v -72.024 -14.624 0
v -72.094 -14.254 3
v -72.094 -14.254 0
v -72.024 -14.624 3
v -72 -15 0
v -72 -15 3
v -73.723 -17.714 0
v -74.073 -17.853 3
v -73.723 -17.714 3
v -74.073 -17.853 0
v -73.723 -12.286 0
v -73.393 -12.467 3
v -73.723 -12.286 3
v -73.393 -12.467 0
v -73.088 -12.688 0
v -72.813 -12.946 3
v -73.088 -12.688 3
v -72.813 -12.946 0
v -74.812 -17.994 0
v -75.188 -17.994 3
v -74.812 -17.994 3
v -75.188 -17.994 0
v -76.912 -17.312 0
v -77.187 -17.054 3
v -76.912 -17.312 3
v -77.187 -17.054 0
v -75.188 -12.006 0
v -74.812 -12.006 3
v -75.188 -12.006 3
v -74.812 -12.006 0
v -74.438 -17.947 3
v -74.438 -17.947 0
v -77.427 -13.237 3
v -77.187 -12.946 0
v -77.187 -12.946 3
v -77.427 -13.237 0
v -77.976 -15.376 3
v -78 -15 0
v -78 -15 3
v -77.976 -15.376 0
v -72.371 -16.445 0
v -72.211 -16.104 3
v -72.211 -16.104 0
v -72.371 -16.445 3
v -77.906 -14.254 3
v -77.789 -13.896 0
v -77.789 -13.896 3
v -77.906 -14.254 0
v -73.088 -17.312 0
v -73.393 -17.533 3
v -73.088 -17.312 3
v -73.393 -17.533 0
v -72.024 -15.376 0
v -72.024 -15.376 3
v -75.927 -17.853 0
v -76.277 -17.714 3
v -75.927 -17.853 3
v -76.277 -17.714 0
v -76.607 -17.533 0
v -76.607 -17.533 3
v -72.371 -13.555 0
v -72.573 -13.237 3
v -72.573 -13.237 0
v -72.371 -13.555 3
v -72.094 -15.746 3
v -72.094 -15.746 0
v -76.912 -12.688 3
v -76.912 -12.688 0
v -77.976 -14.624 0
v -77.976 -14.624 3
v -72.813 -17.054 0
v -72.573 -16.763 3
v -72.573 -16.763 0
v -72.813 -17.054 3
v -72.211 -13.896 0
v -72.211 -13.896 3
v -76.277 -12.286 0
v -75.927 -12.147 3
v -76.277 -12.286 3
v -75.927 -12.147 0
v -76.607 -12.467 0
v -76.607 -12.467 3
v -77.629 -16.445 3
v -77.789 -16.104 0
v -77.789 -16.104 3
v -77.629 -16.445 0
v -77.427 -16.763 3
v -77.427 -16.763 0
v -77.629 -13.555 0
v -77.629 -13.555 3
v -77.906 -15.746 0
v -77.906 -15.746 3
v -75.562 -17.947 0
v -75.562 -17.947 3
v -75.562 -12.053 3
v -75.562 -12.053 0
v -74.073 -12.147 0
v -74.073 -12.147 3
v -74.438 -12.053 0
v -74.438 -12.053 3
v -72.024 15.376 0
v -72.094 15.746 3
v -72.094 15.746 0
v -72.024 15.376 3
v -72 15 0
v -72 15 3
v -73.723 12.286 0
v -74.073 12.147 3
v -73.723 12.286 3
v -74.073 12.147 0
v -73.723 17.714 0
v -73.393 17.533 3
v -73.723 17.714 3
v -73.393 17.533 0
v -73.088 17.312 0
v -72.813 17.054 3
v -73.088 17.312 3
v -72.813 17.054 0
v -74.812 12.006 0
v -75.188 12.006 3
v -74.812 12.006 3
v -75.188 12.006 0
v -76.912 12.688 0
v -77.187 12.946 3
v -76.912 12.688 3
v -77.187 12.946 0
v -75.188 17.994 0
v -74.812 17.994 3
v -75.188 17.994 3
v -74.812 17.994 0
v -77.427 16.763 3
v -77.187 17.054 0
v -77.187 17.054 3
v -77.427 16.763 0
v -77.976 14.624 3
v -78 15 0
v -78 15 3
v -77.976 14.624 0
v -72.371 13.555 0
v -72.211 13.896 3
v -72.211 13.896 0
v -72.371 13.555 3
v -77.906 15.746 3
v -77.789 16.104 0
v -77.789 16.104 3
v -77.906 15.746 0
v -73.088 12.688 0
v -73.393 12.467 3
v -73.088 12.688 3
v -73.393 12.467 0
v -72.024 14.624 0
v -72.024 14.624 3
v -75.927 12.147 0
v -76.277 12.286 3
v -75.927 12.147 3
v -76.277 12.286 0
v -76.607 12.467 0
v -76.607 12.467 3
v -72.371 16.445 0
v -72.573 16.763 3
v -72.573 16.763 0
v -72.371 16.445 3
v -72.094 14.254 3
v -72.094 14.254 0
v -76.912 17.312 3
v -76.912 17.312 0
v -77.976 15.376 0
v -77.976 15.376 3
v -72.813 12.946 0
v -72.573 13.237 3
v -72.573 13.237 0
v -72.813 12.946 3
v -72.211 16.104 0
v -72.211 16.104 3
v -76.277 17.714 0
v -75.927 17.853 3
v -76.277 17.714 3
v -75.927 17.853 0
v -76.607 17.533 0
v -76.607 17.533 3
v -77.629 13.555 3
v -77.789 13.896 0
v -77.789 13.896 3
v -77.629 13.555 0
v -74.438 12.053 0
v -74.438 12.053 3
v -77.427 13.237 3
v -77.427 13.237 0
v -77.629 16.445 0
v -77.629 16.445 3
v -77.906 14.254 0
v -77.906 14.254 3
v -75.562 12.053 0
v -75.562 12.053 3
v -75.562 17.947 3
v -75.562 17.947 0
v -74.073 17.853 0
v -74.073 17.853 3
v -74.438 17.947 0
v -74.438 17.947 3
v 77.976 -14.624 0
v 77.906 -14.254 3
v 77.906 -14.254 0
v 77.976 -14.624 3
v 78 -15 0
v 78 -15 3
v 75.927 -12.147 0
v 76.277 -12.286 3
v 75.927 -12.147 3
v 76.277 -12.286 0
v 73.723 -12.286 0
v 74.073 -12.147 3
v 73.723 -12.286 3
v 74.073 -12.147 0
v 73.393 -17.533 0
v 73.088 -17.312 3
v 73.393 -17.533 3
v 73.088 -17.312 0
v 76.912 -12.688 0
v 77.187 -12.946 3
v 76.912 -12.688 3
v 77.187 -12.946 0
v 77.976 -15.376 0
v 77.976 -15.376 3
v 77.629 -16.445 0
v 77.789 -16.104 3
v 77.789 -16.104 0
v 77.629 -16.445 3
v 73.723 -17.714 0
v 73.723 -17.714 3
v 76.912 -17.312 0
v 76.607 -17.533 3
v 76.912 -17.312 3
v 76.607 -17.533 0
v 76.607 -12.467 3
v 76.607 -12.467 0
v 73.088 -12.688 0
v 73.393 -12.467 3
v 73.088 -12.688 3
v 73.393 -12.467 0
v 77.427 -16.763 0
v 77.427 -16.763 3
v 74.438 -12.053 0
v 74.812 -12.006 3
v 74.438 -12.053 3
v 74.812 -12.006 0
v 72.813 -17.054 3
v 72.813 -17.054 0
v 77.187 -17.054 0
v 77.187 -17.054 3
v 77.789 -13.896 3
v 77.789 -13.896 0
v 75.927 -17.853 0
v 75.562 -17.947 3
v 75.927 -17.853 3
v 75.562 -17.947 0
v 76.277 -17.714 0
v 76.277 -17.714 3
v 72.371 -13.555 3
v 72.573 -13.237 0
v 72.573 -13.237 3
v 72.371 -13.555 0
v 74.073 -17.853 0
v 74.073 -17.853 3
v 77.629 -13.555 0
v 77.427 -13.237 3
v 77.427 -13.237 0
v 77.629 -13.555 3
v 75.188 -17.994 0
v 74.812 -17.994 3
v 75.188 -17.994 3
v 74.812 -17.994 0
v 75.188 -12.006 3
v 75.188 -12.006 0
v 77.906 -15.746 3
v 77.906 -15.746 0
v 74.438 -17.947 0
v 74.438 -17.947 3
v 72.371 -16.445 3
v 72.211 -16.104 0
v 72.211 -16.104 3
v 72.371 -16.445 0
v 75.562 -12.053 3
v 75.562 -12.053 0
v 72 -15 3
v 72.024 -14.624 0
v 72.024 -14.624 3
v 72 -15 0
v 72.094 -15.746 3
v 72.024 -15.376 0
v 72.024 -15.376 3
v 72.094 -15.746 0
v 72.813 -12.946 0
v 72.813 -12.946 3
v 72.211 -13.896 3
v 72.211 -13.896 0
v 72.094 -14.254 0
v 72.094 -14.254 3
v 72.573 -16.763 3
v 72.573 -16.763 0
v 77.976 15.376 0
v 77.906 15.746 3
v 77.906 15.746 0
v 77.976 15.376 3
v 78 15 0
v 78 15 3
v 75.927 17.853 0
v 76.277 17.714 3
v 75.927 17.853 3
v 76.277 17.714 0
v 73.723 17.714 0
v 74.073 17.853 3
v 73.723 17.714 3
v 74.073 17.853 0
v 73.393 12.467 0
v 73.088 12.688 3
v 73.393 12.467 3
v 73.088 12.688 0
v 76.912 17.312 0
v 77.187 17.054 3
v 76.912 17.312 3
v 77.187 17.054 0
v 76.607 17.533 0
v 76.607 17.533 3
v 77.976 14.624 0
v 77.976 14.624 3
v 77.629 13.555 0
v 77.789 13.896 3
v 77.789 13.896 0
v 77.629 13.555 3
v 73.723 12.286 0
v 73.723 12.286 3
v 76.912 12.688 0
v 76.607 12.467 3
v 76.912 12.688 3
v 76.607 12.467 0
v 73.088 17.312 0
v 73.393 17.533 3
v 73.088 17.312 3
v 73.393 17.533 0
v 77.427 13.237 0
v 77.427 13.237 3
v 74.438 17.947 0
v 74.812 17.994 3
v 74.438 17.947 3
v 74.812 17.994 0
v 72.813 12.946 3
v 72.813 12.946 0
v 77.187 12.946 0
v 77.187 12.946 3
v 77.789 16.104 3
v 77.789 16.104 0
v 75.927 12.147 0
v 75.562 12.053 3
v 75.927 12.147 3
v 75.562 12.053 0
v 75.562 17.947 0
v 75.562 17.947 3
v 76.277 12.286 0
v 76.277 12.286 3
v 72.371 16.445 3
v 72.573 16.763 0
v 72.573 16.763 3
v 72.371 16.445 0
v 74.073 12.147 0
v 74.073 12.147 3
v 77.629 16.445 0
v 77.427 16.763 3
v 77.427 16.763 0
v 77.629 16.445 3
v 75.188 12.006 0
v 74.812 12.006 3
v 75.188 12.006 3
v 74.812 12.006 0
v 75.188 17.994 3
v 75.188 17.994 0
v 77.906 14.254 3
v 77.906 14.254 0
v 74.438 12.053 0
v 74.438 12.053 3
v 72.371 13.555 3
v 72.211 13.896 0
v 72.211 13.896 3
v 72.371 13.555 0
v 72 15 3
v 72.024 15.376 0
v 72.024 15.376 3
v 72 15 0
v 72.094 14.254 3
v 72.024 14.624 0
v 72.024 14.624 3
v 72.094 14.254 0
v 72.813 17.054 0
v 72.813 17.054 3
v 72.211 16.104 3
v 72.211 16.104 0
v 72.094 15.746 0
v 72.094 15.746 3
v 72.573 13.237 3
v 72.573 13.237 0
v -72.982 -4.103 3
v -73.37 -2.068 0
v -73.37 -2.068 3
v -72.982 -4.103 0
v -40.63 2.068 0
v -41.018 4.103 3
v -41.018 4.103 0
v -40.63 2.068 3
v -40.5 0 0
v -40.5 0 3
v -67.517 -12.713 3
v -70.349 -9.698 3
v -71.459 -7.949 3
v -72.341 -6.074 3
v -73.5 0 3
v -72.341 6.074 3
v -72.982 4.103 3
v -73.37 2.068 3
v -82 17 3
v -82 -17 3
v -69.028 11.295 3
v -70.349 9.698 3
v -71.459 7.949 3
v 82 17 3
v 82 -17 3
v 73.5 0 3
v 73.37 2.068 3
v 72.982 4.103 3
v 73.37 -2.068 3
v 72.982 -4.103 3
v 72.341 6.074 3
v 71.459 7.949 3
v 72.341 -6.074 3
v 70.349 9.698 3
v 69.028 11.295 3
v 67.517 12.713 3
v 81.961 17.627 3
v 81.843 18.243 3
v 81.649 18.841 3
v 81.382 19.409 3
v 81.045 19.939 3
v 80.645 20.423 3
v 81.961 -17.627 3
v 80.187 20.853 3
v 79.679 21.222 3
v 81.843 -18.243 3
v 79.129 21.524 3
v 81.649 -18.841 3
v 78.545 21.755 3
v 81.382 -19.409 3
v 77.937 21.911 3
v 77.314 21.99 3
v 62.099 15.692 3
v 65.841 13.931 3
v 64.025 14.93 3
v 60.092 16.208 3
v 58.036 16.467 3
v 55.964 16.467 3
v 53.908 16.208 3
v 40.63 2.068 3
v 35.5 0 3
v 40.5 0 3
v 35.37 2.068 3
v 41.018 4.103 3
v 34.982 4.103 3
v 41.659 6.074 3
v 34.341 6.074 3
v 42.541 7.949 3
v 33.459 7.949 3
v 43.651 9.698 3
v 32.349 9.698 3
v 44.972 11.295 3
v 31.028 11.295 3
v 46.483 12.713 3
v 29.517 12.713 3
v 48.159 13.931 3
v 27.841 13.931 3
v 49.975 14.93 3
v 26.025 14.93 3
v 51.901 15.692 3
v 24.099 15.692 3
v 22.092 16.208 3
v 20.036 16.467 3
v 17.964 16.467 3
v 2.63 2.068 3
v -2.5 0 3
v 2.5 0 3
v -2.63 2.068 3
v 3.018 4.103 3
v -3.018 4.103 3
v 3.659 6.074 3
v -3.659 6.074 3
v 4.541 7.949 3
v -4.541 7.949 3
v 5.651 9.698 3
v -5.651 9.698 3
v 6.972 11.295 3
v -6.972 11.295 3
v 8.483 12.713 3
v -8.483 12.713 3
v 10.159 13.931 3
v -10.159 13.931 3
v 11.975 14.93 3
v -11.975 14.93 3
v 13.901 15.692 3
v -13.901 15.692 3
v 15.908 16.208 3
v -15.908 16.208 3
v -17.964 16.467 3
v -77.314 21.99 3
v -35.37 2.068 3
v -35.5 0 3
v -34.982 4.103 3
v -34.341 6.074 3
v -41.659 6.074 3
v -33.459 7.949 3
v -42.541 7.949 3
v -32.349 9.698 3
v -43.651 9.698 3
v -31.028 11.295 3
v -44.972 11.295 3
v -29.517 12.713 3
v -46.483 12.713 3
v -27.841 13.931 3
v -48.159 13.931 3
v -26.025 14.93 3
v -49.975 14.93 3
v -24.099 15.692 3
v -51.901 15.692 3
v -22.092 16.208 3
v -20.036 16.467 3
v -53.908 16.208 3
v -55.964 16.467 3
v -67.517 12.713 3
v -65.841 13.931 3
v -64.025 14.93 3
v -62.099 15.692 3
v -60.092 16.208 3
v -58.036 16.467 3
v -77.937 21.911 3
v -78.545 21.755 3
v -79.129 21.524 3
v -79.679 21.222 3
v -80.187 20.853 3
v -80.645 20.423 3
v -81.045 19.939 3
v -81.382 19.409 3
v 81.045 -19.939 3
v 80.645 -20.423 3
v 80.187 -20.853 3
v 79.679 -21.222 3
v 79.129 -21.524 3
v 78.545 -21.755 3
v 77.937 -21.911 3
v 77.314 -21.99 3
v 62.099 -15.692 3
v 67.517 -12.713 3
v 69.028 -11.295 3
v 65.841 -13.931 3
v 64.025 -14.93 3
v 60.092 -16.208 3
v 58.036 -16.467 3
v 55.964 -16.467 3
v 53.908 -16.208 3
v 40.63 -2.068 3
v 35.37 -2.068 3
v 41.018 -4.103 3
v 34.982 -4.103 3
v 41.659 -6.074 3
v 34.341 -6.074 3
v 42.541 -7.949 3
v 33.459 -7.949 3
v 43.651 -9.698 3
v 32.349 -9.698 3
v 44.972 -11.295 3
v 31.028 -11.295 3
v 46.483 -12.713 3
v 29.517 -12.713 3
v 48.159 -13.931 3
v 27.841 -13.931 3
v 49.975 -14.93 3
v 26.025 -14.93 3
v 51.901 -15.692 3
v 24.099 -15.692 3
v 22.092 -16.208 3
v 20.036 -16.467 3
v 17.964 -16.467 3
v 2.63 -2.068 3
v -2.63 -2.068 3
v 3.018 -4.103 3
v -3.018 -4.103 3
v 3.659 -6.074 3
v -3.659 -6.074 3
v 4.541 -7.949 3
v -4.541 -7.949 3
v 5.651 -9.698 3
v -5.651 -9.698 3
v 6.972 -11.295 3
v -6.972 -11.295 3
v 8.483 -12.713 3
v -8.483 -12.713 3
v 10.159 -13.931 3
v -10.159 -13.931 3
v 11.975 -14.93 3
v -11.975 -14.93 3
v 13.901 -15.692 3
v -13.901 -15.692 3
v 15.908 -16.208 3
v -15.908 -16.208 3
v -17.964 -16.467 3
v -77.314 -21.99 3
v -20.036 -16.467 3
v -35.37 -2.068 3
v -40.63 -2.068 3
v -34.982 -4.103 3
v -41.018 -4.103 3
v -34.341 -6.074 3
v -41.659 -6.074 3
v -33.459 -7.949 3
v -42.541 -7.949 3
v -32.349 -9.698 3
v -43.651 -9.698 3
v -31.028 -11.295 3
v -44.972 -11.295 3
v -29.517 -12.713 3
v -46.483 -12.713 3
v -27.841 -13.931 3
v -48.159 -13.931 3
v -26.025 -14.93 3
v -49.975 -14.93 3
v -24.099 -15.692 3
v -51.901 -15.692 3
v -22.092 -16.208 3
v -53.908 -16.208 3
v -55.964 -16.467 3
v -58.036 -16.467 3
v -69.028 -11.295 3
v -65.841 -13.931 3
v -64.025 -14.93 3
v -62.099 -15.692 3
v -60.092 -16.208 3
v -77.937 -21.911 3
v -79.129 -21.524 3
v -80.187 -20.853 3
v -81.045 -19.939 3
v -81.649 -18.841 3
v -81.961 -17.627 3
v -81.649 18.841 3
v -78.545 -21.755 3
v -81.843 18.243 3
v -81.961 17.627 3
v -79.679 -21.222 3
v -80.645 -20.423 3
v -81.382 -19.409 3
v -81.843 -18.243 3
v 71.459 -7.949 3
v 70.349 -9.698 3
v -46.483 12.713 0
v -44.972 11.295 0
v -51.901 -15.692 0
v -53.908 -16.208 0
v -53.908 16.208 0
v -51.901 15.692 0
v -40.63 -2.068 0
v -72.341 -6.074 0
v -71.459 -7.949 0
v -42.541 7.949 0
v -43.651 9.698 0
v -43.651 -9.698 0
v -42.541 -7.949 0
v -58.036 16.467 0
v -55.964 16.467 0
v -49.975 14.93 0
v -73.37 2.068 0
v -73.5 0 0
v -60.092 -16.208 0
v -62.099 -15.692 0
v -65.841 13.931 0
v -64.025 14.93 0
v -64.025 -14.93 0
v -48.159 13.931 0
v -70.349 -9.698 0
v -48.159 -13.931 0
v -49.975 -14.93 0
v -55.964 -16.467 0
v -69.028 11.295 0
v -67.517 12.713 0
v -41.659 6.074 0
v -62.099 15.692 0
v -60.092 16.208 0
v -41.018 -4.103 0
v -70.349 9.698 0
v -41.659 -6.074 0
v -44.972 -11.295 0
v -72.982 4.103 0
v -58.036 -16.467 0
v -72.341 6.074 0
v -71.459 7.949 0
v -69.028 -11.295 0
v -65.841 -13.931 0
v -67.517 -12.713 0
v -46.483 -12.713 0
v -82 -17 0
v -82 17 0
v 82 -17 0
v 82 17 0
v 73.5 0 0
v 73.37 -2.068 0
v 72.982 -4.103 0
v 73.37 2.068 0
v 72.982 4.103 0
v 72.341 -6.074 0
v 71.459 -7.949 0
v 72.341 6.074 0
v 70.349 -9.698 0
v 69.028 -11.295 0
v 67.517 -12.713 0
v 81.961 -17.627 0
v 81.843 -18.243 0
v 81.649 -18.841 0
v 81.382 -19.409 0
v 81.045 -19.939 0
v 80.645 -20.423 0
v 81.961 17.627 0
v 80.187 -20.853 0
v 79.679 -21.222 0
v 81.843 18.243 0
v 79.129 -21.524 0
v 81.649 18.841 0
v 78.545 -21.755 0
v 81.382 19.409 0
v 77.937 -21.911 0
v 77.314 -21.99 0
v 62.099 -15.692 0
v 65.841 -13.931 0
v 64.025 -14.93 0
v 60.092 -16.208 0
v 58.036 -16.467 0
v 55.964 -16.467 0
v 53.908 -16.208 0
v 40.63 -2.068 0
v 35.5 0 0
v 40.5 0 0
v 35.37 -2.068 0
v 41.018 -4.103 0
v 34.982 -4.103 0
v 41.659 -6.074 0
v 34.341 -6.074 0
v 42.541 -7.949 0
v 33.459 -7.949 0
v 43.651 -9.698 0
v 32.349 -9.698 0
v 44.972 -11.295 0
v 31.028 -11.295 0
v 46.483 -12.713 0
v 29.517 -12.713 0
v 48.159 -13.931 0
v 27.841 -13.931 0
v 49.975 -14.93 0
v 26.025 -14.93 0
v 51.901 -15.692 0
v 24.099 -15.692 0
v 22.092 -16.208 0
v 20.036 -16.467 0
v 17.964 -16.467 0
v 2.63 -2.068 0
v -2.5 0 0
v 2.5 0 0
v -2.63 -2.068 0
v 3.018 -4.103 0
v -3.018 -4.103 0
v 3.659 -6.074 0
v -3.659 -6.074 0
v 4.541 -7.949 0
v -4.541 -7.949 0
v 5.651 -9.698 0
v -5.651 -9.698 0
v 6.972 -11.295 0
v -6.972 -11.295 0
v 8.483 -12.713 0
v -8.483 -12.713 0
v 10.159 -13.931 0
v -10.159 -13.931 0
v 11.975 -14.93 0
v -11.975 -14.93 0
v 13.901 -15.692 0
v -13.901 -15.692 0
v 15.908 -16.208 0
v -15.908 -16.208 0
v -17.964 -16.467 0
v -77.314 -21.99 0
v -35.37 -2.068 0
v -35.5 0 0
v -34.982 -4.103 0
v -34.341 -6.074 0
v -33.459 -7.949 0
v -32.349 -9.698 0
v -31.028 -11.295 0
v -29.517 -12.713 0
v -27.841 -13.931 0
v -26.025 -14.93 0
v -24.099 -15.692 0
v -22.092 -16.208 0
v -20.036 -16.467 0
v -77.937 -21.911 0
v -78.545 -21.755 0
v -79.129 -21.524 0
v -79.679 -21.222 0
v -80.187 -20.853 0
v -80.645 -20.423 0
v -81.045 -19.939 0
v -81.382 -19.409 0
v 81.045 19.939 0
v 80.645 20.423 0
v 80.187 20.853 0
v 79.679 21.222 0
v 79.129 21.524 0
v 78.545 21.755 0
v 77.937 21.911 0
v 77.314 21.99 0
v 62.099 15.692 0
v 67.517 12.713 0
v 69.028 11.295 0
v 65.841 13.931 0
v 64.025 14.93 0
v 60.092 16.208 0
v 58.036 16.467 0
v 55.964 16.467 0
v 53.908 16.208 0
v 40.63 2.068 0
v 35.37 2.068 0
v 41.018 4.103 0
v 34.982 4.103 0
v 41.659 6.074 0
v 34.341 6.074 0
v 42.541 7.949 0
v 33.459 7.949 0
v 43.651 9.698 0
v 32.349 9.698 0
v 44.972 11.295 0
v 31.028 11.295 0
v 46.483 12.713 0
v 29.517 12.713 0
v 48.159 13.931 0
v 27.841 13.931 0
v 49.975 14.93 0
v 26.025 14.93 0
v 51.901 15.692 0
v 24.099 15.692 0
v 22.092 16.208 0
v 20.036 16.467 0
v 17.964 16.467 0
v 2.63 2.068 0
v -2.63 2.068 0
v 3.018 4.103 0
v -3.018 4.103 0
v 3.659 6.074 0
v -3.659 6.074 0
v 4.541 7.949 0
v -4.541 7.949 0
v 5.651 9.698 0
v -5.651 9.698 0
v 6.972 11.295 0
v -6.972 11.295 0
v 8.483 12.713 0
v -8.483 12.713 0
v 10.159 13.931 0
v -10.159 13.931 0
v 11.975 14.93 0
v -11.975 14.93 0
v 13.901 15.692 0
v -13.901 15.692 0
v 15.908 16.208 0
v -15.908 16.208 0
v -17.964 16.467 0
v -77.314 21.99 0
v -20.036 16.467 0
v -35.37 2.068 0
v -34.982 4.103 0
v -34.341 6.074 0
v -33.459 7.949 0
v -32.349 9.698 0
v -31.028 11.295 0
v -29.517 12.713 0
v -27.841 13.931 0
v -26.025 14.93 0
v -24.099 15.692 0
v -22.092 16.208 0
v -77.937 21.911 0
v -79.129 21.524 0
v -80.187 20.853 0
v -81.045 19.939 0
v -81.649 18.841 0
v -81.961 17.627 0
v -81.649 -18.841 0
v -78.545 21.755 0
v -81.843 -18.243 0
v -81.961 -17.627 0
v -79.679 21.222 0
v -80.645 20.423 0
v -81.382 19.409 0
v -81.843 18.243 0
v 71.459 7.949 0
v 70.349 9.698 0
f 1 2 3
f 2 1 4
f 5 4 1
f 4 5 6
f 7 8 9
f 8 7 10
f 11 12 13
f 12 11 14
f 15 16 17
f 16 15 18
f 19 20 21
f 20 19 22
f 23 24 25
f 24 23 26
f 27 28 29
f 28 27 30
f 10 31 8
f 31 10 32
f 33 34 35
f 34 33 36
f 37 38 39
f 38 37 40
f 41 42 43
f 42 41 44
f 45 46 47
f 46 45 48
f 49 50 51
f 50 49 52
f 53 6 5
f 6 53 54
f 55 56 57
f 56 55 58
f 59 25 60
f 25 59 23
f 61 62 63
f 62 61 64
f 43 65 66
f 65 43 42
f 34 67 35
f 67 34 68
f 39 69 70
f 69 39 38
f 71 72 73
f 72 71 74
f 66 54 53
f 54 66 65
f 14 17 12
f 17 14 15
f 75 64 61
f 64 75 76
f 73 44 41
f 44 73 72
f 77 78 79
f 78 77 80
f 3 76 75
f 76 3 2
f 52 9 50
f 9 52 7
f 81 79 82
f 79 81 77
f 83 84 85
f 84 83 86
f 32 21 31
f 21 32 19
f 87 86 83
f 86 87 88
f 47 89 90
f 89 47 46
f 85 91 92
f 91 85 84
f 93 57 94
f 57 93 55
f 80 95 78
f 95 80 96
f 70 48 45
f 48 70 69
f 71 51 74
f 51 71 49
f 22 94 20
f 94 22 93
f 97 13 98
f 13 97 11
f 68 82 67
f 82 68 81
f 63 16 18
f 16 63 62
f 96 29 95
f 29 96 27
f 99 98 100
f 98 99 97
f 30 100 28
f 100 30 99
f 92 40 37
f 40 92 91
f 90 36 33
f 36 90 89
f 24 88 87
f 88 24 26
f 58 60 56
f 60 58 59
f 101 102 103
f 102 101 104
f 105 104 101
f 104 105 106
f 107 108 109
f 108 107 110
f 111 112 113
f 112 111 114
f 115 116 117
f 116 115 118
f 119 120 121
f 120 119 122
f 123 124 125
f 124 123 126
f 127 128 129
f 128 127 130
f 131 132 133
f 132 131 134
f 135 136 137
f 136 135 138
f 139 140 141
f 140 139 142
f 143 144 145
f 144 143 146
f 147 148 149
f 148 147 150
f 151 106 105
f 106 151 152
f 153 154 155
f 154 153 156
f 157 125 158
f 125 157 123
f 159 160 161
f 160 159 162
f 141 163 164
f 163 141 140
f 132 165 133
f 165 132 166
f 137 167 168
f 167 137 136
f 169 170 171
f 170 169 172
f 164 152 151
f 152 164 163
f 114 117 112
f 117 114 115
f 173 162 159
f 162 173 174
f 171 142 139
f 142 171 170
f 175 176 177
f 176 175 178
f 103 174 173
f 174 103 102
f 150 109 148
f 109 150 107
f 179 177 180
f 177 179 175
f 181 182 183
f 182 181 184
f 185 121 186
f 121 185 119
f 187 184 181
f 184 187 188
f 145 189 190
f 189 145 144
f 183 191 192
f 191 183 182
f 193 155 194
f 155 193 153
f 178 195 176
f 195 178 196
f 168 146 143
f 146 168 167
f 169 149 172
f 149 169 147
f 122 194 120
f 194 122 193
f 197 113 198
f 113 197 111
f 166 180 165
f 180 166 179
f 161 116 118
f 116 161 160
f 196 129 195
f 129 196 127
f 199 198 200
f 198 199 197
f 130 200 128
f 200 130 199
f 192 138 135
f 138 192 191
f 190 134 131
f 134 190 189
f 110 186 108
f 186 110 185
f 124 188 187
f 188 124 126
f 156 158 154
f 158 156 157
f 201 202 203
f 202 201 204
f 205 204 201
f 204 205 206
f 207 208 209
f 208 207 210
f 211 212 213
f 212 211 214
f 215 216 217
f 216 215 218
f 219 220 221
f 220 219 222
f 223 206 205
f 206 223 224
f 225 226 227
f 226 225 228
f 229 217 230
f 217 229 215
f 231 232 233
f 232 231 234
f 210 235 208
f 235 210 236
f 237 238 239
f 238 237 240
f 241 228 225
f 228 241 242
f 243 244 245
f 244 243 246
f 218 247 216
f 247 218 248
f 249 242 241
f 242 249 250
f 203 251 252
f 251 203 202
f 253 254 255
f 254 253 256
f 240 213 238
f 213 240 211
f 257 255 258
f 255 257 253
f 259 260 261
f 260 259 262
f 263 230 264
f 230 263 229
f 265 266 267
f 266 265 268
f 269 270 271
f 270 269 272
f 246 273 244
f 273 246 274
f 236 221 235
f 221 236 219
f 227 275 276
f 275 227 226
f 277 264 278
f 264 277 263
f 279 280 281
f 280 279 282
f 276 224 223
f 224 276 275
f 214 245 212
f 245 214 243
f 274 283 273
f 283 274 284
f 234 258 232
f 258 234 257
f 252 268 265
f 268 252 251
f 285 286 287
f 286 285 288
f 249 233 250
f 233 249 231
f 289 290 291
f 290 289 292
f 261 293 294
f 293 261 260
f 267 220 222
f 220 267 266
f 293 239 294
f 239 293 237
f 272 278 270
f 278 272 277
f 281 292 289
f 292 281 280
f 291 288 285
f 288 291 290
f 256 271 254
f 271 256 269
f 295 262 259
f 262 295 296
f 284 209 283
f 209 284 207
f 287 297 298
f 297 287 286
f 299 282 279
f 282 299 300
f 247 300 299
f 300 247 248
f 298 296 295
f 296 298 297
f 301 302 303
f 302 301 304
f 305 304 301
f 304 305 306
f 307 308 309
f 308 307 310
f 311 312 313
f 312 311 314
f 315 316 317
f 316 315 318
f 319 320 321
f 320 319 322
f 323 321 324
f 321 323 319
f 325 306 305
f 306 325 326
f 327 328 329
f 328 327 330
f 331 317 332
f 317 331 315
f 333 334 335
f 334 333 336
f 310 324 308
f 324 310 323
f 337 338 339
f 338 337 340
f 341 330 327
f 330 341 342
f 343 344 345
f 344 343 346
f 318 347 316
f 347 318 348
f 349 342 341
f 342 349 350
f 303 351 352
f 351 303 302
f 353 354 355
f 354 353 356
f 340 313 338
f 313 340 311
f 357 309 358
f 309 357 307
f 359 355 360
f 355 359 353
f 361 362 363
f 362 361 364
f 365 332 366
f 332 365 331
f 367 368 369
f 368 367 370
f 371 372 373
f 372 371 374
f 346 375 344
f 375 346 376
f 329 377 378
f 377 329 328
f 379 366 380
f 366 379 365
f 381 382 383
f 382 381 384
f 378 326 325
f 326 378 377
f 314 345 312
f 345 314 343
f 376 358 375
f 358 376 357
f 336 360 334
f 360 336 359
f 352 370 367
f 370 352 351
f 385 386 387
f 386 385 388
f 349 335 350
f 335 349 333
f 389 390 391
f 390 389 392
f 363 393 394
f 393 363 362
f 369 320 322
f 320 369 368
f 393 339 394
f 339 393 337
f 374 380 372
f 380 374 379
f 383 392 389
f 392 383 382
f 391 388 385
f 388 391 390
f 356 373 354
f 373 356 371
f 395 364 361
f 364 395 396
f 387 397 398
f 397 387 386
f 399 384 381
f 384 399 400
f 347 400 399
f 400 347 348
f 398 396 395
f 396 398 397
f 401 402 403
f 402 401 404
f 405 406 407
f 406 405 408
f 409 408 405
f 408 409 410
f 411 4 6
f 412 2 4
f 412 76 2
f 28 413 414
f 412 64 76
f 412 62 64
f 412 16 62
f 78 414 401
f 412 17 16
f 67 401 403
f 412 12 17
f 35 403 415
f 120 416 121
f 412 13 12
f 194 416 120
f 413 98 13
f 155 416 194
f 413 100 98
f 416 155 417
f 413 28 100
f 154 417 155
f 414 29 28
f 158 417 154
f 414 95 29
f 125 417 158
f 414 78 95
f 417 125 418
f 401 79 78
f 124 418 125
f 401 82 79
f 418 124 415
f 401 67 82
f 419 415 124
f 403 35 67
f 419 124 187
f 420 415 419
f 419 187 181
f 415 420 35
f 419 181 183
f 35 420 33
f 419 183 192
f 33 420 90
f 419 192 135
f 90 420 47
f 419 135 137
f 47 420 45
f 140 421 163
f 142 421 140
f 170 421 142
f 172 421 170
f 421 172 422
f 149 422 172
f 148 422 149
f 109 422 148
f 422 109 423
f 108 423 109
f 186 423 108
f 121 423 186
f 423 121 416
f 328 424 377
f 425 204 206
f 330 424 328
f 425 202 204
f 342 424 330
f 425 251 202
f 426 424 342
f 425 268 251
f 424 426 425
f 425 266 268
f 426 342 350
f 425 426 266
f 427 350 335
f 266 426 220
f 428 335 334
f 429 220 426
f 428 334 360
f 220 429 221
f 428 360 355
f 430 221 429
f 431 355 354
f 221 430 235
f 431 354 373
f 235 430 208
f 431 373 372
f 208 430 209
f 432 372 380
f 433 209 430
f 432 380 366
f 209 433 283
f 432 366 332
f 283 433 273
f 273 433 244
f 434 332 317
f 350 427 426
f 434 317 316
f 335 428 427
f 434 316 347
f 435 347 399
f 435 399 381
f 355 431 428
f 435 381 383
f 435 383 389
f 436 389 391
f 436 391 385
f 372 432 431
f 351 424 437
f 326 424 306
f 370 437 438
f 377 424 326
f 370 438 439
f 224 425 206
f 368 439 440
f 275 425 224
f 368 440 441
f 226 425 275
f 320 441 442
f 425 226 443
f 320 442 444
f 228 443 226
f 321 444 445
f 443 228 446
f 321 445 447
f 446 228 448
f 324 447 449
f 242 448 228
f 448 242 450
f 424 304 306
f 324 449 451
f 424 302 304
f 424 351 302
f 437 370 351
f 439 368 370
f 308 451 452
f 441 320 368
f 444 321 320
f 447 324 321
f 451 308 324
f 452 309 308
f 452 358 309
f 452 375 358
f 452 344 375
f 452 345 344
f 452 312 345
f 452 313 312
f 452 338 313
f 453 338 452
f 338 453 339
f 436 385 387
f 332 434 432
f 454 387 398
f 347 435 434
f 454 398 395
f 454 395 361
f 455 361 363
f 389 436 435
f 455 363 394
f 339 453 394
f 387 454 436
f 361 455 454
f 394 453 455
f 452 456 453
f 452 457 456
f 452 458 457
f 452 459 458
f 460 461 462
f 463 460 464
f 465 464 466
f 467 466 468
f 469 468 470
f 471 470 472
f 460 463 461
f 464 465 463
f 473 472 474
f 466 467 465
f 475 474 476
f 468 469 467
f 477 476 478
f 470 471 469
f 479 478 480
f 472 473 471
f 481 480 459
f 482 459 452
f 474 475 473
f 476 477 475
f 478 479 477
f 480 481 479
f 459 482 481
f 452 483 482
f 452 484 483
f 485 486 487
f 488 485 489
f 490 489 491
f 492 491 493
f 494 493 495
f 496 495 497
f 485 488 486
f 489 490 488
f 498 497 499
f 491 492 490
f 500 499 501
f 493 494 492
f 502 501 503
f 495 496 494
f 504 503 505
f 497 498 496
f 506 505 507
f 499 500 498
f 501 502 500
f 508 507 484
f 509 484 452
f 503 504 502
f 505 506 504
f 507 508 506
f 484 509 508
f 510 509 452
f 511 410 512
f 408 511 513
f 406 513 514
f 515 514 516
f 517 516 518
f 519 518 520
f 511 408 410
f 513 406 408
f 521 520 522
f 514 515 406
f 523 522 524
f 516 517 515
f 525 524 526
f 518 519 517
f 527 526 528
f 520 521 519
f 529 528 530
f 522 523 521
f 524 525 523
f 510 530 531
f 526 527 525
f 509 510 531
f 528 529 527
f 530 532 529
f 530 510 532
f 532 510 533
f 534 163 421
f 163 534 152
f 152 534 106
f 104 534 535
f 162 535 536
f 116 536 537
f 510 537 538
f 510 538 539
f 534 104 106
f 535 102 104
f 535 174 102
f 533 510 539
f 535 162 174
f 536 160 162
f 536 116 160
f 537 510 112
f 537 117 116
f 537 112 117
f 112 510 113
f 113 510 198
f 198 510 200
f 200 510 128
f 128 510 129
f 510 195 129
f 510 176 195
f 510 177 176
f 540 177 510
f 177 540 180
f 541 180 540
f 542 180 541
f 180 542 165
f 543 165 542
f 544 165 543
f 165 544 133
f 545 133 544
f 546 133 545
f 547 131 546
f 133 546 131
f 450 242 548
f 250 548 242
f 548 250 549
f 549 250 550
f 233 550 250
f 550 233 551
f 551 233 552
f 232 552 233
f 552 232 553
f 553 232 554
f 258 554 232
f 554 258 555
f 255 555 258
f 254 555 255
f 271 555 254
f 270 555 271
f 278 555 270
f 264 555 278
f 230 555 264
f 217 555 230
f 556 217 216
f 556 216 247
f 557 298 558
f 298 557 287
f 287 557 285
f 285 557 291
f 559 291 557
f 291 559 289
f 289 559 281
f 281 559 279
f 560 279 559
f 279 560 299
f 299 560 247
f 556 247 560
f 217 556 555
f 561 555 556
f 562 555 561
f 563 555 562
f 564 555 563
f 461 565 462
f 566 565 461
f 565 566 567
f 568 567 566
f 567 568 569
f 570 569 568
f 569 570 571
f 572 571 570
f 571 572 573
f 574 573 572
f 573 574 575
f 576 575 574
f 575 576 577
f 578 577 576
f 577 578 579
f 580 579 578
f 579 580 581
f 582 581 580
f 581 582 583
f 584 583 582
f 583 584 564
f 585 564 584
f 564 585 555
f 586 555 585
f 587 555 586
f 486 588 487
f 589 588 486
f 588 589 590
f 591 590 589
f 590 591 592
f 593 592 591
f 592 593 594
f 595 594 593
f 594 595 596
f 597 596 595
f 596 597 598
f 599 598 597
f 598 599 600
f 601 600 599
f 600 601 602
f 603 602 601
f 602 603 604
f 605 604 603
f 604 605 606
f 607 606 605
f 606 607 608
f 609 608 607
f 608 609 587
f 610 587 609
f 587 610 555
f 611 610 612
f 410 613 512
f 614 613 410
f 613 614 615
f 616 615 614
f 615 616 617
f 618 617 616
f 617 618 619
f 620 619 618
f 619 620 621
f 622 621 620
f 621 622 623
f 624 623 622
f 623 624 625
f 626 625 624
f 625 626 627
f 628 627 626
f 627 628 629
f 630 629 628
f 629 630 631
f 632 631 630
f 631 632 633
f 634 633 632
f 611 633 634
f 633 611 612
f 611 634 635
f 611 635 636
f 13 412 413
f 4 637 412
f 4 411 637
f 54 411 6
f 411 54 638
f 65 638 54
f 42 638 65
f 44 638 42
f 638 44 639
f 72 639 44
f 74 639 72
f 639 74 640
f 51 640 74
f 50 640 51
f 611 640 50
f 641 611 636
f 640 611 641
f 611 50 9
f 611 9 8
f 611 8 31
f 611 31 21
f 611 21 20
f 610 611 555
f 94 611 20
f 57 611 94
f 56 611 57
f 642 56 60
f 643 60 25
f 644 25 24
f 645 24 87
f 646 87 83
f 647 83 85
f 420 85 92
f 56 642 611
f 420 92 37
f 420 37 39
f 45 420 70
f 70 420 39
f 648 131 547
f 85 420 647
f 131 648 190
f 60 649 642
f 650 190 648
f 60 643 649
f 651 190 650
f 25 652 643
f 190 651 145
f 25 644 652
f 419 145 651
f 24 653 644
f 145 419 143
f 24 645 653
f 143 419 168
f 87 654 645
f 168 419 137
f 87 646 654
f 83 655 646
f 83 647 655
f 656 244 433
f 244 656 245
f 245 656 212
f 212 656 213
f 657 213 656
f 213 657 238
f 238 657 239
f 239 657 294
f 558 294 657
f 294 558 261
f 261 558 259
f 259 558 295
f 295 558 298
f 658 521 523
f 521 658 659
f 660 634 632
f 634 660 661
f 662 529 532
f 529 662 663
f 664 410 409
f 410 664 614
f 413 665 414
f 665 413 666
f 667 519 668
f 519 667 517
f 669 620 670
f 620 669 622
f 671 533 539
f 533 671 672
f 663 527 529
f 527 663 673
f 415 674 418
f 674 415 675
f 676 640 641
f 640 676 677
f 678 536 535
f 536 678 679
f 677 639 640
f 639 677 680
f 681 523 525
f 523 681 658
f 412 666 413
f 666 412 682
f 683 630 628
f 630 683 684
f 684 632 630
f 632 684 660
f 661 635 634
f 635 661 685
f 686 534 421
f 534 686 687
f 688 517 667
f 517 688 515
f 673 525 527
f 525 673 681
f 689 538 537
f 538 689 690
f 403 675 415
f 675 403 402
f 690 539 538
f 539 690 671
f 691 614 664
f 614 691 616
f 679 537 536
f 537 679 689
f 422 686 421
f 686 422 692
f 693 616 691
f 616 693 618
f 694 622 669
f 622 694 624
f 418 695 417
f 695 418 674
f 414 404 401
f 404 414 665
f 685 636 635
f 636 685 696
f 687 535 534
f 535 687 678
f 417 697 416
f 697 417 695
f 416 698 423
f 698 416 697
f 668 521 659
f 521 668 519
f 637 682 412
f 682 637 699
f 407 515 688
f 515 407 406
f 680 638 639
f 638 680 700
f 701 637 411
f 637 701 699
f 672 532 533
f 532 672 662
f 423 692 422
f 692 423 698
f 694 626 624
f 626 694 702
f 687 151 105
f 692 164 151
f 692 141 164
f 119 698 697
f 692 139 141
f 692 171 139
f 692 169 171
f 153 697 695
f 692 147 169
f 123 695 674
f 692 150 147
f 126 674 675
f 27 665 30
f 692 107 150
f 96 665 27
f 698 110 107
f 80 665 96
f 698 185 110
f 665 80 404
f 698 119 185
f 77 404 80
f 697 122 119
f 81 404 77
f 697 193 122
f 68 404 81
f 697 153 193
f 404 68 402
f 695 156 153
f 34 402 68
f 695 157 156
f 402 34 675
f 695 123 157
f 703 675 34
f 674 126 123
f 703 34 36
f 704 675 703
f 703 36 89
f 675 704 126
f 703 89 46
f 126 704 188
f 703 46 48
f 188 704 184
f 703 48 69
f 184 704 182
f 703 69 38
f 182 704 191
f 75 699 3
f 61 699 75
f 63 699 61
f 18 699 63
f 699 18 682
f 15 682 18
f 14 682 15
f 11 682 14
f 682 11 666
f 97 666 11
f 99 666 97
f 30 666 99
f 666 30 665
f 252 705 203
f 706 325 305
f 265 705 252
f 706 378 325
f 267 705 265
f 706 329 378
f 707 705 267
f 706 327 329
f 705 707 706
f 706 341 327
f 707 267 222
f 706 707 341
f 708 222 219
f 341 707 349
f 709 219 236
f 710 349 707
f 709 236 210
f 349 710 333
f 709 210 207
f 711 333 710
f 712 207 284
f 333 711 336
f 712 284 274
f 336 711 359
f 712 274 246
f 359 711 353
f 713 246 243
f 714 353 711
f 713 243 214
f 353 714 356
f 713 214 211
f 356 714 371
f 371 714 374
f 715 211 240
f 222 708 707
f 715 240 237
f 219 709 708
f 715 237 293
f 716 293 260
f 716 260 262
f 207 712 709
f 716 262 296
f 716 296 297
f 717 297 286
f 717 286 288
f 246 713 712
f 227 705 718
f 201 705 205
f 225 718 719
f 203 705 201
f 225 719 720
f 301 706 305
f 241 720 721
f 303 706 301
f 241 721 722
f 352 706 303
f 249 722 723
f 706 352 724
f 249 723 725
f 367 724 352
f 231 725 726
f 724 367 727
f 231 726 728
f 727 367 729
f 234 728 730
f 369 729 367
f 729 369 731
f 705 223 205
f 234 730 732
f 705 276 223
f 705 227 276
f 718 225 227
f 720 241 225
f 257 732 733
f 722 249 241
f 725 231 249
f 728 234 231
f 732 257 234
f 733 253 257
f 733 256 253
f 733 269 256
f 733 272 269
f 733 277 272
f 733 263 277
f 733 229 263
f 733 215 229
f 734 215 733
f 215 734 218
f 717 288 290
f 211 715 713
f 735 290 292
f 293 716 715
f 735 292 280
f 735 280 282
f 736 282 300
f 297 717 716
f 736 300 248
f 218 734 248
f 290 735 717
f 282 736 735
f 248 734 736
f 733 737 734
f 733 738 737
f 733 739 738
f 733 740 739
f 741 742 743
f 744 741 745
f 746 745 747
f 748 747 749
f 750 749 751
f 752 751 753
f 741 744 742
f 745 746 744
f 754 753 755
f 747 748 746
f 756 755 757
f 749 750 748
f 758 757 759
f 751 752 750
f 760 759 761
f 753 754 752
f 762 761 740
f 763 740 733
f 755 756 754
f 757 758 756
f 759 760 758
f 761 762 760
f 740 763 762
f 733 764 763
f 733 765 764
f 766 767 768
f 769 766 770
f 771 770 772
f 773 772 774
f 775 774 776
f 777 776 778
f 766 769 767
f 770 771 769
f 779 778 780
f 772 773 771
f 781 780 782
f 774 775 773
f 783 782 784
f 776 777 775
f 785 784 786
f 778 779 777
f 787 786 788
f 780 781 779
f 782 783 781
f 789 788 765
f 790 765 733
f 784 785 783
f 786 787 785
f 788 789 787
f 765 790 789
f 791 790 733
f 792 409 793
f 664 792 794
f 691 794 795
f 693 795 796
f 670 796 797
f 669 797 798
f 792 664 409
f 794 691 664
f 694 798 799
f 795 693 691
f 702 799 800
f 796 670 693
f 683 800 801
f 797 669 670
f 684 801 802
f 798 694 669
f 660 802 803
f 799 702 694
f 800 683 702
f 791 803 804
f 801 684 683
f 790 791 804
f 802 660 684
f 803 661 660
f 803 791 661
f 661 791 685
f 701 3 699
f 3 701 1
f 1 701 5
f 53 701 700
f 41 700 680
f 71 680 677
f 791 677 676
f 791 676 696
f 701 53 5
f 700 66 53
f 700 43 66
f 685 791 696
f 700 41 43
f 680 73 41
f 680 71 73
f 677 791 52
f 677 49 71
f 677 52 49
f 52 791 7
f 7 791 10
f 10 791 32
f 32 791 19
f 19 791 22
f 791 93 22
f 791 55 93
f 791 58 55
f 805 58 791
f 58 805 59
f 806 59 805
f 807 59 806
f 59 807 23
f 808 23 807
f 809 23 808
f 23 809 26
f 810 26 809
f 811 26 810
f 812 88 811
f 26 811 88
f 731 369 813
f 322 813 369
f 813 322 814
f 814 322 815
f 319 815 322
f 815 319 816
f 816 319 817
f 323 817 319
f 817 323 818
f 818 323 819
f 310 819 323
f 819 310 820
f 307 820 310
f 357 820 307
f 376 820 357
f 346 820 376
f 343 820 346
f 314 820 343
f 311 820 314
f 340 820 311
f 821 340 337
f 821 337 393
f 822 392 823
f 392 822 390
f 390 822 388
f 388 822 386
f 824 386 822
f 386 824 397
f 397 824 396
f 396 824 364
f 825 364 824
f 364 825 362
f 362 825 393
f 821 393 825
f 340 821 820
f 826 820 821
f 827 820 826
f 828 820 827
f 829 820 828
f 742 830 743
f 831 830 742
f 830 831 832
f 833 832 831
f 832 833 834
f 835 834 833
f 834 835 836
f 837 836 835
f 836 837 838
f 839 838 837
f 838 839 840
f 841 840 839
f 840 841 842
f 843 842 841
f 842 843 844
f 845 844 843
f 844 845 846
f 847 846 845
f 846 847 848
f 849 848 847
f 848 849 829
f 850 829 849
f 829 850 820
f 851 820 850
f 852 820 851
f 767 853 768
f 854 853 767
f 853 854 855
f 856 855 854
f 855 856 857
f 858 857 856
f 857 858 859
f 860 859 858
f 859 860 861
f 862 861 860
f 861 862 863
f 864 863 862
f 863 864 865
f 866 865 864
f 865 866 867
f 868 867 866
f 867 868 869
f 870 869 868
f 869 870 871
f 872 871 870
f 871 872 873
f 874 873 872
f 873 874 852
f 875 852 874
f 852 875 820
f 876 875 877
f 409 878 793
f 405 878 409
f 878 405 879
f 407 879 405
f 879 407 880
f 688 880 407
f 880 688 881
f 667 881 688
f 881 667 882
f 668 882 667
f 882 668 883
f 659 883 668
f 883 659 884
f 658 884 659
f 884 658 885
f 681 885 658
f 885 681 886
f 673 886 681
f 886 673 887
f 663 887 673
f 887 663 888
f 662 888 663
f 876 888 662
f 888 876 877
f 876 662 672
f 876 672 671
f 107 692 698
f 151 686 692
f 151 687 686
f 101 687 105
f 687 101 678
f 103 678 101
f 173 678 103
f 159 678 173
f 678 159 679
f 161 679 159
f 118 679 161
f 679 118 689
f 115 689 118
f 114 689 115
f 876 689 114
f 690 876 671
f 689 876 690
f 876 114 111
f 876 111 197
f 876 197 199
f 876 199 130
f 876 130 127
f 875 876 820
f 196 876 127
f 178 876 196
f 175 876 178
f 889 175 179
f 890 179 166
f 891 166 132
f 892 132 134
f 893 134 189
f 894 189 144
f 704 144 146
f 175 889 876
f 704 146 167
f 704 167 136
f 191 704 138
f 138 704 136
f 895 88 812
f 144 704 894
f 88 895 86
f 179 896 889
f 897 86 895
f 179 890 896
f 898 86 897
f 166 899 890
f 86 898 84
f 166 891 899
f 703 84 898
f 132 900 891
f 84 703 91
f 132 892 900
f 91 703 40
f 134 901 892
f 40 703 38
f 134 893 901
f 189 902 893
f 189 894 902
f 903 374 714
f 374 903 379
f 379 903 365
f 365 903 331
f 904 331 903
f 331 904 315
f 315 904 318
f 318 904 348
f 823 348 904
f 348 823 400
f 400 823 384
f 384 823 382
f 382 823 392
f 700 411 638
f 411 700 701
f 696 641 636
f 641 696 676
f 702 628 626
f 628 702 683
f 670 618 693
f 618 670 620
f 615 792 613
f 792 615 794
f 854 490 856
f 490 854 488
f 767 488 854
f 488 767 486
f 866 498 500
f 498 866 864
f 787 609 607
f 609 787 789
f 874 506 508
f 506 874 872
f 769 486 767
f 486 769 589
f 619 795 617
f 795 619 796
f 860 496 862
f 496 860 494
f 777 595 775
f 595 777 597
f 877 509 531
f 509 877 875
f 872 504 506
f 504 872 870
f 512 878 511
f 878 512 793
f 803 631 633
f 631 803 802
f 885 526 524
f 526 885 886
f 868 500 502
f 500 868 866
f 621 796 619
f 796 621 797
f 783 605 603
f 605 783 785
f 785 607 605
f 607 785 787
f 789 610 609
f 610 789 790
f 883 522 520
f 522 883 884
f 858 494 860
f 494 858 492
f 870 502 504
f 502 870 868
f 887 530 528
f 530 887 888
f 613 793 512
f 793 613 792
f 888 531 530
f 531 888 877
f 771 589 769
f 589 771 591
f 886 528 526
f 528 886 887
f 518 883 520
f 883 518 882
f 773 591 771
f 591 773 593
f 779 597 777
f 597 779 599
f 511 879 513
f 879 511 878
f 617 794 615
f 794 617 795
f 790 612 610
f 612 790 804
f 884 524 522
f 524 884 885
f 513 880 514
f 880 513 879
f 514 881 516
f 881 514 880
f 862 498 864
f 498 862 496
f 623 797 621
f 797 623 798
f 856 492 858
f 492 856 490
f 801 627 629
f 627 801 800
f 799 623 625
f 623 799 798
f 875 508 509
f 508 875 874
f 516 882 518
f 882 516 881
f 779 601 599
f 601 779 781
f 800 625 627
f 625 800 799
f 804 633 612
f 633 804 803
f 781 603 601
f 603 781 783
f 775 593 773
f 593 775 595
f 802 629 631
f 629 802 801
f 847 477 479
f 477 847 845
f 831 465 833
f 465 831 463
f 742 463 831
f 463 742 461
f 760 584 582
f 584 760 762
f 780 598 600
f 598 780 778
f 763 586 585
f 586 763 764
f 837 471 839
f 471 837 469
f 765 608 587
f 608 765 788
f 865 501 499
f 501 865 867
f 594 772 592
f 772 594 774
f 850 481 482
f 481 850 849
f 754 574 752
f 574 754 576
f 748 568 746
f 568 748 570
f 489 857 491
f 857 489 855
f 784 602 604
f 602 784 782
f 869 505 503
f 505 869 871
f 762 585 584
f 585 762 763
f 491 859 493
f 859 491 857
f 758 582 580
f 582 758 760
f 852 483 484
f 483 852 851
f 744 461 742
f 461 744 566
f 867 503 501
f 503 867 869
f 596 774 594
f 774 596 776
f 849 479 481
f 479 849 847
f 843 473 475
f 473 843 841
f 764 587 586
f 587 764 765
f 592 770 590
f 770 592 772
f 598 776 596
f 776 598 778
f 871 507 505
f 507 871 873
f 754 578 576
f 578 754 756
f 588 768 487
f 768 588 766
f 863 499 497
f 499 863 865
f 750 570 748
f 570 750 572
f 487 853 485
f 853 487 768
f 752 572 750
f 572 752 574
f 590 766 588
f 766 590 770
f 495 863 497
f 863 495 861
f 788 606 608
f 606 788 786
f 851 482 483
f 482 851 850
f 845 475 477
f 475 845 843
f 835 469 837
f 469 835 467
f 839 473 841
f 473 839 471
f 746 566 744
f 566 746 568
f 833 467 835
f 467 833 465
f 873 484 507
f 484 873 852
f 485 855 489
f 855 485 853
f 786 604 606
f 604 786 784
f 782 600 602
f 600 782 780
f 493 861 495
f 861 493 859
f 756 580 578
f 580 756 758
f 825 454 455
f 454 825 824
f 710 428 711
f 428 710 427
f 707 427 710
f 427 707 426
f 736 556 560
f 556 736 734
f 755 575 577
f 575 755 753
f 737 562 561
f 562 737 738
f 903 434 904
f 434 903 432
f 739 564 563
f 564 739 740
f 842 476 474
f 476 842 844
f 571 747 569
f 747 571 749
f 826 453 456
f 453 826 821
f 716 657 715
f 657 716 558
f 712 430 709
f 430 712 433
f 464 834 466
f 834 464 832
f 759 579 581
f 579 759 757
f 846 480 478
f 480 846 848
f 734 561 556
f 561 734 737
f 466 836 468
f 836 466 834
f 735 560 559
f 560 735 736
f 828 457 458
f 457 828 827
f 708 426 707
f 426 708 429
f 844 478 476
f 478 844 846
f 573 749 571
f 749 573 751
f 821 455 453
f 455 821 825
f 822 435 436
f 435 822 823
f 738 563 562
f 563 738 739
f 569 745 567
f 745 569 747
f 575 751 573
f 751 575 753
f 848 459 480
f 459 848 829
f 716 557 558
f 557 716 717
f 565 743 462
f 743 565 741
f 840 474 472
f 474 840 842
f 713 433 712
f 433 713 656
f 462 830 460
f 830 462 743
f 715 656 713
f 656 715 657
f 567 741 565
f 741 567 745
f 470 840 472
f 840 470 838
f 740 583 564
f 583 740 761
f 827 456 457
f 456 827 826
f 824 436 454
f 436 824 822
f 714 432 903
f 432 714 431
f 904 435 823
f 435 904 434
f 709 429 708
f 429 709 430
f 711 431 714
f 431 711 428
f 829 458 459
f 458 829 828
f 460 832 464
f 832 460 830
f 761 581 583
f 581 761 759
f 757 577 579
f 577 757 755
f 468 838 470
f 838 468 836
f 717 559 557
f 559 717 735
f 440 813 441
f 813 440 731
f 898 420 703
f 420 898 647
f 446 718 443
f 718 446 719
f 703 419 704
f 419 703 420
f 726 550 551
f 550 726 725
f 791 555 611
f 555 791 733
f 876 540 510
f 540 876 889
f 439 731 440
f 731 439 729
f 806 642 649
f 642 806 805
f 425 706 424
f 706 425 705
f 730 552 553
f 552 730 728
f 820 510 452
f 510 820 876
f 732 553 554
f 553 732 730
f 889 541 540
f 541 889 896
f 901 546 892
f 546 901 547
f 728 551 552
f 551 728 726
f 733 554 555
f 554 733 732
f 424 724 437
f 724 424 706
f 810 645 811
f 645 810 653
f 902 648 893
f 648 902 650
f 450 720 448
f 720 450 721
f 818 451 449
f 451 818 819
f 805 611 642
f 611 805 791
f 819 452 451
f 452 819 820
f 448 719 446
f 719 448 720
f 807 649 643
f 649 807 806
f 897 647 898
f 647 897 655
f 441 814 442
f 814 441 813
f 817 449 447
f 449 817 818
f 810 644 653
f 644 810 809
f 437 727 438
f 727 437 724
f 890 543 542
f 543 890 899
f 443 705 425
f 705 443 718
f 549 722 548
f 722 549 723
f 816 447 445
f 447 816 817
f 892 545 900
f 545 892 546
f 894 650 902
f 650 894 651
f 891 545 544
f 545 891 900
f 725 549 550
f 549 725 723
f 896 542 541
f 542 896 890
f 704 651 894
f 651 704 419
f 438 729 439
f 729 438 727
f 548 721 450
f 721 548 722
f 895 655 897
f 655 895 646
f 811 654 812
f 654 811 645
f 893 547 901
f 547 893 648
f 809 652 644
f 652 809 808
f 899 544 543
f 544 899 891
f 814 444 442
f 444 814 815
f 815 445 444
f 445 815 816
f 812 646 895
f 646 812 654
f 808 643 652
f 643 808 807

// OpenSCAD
$fn = 50;


difference() {
	union() {
		hull() {
			translate(v = [-77.0000000000, 17.0000000000, 0]) {
				cylinder(h = 3, r = 5);
			}
			translate(v = [77.0000000000, 17.0000000000, 0]) {
				cylinder(h = 3, r = 5);
			}
			translate(v = [-77.0000000000, -17.0000000000, 0]) {
				cylinder(h = 3, r = 5);
			}
			translate(v = [77.0000000000, -17.0000000000, 0]) {
				cylinder(h = 3, r = 5);
			}
		}
	}
	union() {
		#translate(v = [-75.0000000000, -15.0000000000, -100.0000000000]) {
			cylinder(h = 200, r = 3.0000000000);
		}
		#translate(v = [-75.0000000000, 15.0000000000, -100.0000000000]) {
			cylinder(h = 200, r = 3.0000000000);
		}
		#translate(v = [75.0000000000, -15.0000000000, -100.0000000000]) {
			cylinder(h = 200, r = 3.0000000000);
		}
		#translate(v = [75.0000000000, 15.0000000000, -100.0000000000]) {
			cylinder(h = 200, r = 3.0000000000);
		}
		#translate(v = [-57.0000000000, 0, 0]) {
			cylinder(h = 3, r = 16.5000000000);
		}
		#translate(v = [-19.0000000000, 0, 0]) {
			cylinder(h = 3, r = 16.5000000000);
		}
		#translate(v = [19.0000000000, 0, 0]) {
			cylinder(h = 3, r = 16.5000000000);
		}
		#translate(v = [57.0000000000, 0, 0]) {
			cylinder(h = 3, r = 16.5000000000);
		}
	}
}
